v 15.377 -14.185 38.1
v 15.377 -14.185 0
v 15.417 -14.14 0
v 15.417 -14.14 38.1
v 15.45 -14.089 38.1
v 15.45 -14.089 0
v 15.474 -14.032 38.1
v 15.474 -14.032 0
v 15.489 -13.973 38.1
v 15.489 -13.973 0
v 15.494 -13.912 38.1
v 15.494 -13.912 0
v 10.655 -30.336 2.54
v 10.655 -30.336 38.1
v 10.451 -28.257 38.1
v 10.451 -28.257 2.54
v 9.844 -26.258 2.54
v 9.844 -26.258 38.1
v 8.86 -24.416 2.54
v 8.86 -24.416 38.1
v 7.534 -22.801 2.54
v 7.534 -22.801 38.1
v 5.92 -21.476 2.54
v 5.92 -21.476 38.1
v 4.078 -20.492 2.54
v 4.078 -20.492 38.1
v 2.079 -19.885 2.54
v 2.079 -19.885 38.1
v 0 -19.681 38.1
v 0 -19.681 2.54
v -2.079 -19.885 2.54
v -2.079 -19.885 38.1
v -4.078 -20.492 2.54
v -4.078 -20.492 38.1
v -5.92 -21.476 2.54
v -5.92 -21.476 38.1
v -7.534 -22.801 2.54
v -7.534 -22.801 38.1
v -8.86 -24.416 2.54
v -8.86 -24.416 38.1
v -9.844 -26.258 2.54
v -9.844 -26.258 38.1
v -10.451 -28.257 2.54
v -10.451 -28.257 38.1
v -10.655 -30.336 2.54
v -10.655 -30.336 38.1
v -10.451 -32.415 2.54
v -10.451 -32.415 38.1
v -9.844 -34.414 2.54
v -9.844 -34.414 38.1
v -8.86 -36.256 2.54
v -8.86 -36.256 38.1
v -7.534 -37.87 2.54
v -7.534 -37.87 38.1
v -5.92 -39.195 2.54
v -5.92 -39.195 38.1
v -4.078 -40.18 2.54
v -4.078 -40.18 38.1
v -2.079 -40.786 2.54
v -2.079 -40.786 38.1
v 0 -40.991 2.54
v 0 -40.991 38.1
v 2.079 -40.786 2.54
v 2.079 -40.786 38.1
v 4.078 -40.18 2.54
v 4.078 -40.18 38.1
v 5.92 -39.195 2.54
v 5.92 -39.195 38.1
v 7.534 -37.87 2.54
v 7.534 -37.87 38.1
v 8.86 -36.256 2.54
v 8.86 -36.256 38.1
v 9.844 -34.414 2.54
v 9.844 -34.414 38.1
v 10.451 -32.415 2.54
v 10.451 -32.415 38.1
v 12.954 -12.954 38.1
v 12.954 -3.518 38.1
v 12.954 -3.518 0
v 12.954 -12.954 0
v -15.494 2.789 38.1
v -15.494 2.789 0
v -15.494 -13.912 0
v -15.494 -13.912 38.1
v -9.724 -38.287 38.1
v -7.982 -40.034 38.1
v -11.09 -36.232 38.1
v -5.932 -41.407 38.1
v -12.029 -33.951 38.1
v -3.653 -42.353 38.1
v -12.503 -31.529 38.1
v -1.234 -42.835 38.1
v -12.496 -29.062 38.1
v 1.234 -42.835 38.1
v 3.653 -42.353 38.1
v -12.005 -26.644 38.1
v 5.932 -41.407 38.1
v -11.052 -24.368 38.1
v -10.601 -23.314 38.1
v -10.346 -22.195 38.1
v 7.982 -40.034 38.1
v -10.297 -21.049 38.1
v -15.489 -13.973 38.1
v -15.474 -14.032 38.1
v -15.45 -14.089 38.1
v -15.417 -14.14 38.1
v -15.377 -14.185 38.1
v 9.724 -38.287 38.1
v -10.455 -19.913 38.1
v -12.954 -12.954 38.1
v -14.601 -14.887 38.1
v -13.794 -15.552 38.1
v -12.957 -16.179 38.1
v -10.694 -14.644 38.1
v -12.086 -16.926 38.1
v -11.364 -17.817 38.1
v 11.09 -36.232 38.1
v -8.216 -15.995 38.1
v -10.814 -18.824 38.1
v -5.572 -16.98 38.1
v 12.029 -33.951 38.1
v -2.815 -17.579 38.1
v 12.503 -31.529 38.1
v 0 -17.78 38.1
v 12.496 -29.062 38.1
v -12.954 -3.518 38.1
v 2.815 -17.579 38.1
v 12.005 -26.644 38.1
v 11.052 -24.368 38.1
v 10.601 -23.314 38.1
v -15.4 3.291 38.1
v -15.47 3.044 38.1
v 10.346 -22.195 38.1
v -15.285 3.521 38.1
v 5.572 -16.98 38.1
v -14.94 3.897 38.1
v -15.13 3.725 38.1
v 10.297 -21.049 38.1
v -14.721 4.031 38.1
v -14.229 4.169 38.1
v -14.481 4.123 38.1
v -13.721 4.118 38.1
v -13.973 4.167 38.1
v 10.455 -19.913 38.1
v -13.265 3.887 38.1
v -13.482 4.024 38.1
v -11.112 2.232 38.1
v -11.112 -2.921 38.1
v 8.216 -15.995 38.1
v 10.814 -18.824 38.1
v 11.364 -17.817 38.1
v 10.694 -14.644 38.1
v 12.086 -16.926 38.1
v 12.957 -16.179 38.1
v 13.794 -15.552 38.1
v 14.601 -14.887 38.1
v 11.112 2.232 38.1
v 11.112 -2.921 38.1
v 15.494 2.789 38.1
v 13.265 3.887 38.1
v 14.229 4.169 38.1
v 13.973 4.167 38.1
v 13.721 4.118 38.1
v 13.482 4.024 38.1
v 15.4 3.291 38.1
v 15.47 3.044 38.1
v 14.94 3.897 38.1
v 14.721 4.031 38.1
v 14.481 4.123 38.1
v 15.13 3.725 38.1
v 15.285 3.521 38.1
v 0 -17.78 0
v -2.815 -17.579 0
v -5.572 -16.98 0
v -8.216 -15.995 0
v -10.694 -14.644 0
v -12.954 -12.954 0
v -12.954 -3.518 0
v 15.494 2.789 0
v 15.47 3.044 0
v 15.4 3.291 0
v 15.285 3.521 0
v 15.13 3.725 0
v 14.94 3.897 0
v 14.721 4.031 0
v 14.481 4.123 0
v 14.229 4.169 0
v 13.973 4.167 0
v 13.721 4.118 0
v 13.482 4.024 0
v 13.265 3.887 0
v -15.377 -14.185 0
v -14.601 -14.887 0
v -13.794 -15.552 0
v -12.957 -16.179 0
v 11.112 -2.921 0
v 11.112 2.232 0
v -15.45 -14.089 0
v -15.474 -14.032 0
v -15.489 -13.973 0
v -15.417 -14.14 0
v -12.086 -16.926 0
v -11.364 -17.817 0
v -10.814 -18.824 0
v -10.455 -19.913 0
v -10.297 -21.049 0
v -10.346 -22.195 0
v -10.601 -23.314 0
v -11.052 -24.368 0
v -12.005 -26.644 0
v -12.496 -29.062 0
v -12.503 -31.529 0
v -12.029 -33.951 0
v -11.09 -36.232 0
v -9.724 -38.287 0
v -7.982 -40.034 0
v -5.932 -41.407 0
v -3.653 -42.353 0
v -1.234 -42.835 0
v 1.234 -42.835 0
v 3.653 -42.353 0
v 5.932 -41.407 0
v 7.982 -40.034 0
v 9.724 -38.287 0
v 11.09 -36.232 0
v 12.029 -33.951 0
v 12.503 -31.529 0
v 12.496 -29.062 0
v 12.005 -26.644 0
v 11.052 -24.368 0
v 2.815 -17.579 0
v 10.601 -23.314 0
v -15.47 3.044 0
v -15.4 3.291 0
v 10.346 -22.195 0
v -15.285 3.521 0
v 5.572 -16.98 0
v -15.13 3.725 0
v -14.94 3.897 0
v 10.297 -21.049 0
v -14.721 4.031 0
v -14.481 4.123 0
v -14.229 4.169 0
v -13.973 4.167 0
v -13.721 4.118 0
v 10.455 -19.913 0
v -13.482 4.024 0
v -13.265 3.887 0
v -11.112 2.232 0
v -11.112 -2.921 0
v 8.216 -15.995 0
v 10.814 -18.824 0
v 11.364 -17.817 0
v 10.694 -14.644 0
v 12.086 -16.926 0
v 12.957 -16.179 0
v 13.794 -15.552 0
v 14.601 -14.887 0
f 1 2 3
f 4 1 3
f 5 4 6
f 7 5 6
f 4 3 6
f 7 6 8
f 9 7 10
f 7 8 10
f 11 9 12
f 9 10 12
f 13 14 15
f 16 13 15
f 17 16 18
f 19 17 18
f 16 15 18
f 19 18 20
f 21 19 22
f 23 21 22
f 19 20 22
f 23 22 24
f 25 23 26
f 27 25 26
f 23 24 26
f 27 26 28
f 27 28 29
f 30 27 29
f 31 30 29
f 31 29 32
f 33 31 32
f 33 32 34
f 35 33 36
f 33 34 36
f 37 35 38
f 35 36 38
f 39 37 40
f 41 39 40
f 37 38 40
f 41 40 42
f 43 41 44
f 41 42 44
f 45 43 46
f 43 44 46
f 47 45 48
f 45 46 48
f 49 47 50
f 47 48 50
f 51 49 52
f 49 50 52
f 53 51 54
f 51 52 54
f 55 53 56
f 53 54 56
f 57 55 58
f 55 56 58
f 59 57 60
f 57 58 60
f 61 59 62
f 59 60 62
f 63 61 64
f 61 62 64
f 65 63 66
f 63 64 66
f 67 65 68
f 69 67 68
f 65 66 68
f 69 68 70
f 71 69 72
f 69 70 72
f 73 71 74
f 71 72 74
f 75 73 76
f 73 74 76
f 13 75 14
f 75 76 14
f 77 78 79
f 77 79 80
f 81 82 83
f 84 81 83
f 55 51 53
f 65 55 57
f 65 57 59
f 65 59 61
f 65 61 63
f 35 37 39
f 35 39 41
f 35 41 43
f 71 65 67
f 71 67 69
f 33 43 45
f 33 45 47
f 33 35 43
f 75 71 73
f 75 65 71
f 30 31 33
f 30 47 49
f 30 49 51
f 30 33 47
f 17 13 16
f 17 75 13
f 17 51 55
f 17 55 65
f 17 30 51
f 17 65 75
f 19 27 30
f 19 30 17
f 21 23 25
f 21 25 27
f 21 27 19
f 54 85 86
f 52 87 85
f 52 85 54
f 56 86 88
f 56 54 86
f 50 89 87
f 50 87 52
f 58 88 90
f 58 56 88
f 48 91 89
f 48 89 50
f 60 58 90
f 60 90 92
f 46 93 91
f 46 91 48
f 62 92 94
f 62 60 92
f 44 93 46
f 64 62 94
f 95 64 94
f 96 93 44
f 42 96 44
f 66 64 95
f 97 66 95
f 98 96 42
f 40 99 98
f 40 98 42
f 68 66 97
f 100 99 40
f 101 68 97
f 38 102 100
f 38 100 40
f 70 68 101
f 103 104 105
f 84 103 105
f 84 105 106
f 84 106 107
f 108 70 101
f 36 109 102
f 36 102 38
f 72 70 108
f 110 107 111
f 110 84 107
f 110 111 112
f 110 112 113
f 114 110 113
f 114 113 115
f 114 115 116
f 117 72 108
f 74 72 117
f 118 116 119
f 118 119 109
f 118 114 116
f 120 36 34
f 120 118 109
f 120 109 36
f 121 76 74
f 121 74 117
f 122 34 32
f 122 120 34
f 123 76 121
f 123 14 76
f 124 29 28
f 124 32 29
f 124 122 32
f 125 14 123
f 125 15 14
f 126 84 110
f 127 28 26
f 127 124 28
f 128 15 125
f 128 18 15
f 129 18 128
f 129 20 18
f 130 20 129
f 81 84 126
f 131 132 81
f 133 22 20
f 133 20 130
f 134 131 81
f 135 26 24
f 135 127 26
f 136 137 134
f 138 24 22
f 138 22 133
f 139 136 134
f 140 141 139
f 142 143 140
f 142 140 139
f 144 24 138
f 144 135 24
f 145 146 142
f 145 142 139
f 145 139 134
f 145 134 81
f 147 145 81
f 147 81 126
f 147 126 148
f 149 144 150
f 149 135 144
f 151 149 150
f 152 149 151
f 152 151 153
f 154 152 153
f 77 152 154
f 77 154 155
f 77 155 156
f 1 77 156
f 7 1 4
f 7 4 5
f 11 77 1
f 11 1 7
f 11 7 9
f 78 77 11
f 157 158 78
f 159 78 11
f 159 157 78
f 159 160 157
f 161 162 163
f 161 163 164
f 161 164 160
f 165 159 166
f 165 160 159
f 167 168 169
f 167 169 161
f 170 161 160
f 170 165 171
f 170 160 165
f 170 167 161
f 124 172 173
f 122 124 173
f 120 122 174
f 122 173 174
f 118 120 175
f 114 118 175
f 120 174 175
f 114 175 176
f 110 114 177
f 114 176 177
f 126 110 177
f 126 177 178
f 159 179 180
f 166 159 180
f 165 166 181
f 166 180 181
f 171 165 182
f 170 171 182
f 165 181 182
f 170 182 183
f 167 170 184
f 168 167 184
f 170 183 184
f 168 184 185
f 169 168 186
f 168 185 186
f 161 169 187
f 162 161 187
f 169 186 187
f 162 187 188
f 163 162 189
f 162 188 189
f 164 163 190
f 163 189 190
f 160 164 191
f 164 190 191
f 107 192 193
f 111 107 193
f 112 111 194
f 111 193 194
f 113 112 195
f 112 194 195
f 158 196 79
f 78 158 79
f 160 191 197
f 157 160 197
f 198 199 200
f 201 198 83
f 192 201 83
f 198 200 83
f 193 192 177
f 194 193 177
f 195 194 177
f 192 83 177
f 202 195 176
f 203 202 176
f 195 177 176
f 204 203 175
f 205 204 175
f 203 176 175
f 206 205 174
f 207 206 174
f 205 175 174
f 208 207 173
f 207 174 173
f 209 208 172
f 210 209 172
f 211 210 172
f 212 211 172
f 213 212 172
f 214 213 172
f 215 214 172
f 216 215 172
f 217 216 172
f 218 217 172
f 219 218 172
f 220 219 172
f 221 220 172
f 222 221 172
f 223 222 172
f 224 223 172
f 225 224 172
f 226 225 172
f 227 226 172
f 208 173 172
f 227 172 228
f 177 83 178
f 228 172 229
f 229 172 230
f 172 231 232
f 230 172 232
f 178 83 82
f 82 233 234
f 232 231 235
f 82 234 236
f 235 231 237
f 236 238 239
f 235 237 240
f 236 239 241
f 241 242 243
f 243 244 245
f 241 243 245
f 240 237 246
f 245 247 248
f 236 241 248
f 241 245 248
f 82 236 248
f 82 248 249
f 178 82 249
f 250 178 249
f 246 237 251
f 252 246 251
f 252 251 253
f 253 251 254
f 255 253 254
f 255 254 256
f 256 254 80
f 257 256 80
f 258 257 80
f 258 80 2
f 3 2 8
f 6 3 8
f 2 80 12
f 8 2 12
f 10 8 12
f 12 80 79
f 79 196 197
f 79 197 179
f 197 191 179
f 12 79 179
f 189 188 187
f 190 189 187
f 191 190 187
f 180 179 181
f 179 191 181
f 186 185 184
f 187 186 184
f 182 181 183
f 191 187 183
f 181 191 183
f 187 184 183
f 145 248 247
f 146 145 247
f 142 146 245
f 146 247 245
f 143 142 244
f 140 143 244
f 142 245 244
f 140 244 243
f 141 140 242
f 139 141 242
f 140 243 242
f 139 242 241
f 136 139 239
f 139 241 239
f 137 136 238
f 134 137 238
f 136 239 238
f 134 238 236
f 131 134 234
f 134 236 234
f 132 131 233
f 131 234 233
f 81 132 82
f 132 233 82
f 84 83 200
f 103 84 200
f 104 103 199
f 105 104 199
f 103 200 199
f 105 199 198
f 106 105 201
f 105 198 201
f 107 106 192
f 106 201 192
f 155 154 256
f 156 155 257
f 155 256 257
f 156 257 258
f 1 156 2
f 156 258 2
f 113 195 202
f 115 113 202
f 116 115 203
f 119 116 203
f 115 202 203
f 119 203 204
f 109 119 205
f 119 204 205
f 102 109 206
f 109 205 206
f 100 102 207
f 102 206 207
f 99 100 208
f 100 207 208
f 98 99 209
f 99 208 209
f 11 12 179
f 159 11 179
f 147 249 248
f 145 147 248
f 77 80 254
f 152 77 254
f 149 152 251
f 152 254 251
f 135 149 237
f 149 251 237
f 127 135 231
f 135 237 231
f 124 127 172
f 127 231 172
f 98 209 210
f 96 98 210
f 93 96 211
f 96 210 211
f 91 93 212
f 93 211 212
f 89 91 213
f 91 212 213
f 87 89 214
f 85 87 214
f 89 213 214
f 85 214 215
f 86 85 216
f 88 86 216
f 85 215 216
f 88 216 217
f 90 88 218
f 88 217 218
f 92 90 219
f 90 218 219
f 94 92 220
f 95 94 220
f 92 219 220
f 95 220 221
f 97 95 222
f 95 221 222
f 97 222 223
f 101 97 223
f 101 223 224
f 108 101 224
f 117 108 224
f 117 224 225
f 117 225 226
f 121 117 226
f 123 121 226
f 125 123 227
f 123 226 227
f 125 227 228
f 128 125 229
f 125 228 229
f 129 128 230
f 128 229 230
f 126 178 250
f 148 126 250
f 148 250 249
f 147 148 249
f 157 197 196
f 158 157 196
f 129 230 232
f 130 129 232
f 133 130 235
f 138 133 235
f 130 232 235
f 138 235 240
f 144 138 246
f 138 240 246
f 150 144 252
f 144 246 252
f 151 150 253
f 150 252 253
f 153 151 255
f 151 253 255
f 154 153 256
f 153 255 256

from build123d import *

# Parameters (mm, degrees)
F2_DEPTH = 38.1
F3_R     = 10.6553
F4_DEPTH = 35.56


with BuildPart() as f2:
    # F1 (on Top) → F2 (new body)
    with BuildSketch(Plane.XY):
        with BuildLine():
            Line((-11.1125, -2.921), (-11.1125, 2.232145))
            Line((-11.1125, 2.232145), (-13.265196, 3.886932))
            ThreePointArc((-13.265196, 3.886932), (-14.72113, 4.031284), (-15.494, 2.789007))
            Line((-15.494, 2.789007), (-15.494, -13.912452))
            ThreePointArc((-15.494, -13.912452), (-15.463442, -14.060988), (-15.376731, -14.185399))
            ThreePointArc((-15.376731, -14.185399), (-14.201681, -15.224533), (-12.956605, -16.178644))
            ThreePointArc((-12.956605, -16.178644), (-10.454692, -19.913141), (-11.052133, -24.368373))
            ThreePointArc((-11.052133, -24.368373), (0, -42.896211), (11.052133, -24.368373))
            ThreePointArc((11.052133, -24.368373), (10.454692, -19.913141), (12.956605, -16.178644))
            ThreePointArc((12.956605, -16.178644), (14.201681, -15.224533), (15.376731, -14.185399))
            ThreePointArc((15.376731, -14.185399), (15.463442, -14.060988), (15.494, -13.912452))
            Line((15.494, -13.912452), (15.494, 2.789007))
            ThreePointArc((15.494, 2.789007), (14.72113, 4.031284), (13.265196, 3.886932))
            Line((13.265196, 3.886932), (11.1125, 2.232145))
            Line((11.1125, 2.232145), (11.1125, -2.921))
            Line((11.1125, -2.921), (12.954, -3.518375))
            Line((12.954, -3.518375), (12.954, -12.954))
            ThreePointArc((12.954, -12.954), (6.911881, -16.534312), (0, -17.78))
            ThreePointArc((0, -17.78), (-6.911881, -16.534312), (-12.954, -12.954))
            Line((-12.954, -12.954), (-12.954, -3.518375))
            Line((-12.954, -3.518375), (-11.1125, -2.921))
        make_face()
    extrude(amount=F2_DEPTH)

    # F3 (on face) → F4 (cut)
    with BuildSketch(Plane.XY.offset(38.1)):
        with Locations((0, -30.335911)):
            Circle(F3_R)
    extrude(amount=-F4_DEPTH, mode=Mode.SUBTRACT)


solid = f2.part
